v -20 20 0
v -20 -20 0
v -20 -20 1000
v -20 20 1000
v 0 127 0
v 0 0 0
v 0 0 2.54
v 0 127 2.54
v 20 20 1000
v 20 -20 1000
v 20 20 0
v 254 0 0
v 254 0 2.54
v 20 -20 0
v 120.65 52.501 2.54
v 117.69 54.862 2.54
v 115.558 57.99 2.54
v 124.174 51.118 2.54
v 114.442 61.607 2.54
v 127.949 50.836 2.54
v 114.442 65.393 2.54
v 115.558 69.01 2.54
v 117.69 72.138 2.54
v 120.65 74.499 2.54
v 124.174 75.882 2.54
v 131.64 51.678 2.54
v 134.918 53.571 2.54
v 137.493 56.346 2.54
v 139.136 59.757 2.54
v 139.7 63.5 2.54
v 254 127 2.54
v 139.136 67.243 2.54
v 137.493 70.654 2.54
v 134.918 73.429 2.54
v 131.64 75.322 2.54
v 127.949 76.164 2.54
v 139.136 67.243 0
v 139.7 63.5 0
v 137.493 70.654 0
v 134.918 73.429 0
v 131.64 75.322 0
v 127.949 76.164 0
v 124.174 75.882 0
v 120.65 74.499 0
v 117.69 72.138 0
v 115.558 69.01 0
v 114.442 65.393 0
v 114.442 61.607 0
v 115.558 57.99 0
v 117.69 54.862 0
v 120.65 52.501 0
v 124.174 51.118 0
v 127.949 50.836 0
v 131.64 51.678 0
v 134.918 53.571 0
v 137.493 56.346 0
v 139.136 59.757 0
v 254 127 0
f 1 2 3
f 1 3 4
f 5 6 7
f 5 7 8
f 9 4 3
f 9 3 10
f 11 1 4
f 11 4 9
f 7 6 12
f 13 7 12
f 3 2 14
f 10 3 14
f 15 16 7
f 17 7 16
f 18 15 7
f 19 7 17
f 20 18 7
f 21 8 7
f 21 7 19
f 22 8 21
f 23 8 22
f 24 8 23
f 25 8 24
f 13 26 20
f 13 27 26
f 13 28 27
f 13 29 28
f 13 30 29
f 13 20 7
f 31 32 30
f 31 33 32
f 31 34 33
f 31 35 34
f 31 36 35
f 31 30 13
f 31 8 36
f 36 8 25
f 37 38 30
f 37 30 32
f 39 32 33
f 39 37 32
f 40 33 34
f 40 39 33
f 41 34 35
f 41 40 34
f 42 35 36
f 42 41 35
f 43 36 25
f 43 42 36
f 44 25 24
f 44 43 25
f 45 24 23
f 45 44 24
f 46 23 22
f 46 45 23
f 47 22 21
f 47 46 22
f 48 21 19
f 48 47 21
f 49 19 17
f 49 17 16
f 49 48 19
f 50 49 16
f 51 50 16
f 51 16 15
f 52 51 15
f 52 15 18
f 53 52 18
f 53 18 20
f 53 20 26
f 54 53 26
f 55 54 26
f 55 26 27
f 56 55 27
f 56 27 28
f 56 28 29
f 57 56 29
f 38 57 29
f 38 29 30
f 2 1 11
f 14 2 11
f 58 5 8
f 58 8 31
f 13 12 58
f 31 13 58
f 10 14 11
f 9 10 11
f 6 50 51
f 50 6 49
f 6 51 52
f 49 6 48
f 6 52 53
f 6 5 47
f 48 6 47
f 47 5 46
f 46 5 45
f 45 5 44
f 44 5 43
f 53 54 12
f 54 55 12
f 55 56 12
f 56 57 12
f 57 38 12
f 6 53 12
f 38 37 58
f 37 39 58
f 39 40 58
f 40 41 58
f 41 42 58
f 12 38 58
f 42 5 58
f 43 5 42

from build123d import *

# Parameters (mm, degrees)
F0_W     = 40
F0_H     = 40
F1_DEPTH = 1000
F2_W     = 254
F2_H     = 127
F2_R     = 12.7
F3_DEPTH = 0.254
F4_DEPTH = 2.54


with BuildPart() as f1:
    # F0 (on Top) → F1 (new body)
    with BuildSketch(Plane.XY):
        Rectangle(F0_W, F0_H)
    extrude(amount=F1_DEPTH)


with BuildPart() as f3:
    # F2 (on Top) → F3 (new body)
    with BuildSketch(Plane.XY):
        with Locations((127, 63.5)):
            Rectangle(F2_W, F2_H)
        with Locations((127, 63.5)):
            Circle(F2_R, mode=Mode.SUBTRACT)
    extrude(amount=F3_DEPTH)

    # F2 (on Top) → F4 (join)
    with BuildSketch(Plane.XY):
        with Locations((127, 63.5)):
            Rectangle(F2_W, F2_H)
        with Locations((127, 63.5)):
            Circle(F2_R, mode=Mode.SUBTRACT)
    extrude(amount=F4_DEPTH)


solid = Compound([f1.part, f3.part])
